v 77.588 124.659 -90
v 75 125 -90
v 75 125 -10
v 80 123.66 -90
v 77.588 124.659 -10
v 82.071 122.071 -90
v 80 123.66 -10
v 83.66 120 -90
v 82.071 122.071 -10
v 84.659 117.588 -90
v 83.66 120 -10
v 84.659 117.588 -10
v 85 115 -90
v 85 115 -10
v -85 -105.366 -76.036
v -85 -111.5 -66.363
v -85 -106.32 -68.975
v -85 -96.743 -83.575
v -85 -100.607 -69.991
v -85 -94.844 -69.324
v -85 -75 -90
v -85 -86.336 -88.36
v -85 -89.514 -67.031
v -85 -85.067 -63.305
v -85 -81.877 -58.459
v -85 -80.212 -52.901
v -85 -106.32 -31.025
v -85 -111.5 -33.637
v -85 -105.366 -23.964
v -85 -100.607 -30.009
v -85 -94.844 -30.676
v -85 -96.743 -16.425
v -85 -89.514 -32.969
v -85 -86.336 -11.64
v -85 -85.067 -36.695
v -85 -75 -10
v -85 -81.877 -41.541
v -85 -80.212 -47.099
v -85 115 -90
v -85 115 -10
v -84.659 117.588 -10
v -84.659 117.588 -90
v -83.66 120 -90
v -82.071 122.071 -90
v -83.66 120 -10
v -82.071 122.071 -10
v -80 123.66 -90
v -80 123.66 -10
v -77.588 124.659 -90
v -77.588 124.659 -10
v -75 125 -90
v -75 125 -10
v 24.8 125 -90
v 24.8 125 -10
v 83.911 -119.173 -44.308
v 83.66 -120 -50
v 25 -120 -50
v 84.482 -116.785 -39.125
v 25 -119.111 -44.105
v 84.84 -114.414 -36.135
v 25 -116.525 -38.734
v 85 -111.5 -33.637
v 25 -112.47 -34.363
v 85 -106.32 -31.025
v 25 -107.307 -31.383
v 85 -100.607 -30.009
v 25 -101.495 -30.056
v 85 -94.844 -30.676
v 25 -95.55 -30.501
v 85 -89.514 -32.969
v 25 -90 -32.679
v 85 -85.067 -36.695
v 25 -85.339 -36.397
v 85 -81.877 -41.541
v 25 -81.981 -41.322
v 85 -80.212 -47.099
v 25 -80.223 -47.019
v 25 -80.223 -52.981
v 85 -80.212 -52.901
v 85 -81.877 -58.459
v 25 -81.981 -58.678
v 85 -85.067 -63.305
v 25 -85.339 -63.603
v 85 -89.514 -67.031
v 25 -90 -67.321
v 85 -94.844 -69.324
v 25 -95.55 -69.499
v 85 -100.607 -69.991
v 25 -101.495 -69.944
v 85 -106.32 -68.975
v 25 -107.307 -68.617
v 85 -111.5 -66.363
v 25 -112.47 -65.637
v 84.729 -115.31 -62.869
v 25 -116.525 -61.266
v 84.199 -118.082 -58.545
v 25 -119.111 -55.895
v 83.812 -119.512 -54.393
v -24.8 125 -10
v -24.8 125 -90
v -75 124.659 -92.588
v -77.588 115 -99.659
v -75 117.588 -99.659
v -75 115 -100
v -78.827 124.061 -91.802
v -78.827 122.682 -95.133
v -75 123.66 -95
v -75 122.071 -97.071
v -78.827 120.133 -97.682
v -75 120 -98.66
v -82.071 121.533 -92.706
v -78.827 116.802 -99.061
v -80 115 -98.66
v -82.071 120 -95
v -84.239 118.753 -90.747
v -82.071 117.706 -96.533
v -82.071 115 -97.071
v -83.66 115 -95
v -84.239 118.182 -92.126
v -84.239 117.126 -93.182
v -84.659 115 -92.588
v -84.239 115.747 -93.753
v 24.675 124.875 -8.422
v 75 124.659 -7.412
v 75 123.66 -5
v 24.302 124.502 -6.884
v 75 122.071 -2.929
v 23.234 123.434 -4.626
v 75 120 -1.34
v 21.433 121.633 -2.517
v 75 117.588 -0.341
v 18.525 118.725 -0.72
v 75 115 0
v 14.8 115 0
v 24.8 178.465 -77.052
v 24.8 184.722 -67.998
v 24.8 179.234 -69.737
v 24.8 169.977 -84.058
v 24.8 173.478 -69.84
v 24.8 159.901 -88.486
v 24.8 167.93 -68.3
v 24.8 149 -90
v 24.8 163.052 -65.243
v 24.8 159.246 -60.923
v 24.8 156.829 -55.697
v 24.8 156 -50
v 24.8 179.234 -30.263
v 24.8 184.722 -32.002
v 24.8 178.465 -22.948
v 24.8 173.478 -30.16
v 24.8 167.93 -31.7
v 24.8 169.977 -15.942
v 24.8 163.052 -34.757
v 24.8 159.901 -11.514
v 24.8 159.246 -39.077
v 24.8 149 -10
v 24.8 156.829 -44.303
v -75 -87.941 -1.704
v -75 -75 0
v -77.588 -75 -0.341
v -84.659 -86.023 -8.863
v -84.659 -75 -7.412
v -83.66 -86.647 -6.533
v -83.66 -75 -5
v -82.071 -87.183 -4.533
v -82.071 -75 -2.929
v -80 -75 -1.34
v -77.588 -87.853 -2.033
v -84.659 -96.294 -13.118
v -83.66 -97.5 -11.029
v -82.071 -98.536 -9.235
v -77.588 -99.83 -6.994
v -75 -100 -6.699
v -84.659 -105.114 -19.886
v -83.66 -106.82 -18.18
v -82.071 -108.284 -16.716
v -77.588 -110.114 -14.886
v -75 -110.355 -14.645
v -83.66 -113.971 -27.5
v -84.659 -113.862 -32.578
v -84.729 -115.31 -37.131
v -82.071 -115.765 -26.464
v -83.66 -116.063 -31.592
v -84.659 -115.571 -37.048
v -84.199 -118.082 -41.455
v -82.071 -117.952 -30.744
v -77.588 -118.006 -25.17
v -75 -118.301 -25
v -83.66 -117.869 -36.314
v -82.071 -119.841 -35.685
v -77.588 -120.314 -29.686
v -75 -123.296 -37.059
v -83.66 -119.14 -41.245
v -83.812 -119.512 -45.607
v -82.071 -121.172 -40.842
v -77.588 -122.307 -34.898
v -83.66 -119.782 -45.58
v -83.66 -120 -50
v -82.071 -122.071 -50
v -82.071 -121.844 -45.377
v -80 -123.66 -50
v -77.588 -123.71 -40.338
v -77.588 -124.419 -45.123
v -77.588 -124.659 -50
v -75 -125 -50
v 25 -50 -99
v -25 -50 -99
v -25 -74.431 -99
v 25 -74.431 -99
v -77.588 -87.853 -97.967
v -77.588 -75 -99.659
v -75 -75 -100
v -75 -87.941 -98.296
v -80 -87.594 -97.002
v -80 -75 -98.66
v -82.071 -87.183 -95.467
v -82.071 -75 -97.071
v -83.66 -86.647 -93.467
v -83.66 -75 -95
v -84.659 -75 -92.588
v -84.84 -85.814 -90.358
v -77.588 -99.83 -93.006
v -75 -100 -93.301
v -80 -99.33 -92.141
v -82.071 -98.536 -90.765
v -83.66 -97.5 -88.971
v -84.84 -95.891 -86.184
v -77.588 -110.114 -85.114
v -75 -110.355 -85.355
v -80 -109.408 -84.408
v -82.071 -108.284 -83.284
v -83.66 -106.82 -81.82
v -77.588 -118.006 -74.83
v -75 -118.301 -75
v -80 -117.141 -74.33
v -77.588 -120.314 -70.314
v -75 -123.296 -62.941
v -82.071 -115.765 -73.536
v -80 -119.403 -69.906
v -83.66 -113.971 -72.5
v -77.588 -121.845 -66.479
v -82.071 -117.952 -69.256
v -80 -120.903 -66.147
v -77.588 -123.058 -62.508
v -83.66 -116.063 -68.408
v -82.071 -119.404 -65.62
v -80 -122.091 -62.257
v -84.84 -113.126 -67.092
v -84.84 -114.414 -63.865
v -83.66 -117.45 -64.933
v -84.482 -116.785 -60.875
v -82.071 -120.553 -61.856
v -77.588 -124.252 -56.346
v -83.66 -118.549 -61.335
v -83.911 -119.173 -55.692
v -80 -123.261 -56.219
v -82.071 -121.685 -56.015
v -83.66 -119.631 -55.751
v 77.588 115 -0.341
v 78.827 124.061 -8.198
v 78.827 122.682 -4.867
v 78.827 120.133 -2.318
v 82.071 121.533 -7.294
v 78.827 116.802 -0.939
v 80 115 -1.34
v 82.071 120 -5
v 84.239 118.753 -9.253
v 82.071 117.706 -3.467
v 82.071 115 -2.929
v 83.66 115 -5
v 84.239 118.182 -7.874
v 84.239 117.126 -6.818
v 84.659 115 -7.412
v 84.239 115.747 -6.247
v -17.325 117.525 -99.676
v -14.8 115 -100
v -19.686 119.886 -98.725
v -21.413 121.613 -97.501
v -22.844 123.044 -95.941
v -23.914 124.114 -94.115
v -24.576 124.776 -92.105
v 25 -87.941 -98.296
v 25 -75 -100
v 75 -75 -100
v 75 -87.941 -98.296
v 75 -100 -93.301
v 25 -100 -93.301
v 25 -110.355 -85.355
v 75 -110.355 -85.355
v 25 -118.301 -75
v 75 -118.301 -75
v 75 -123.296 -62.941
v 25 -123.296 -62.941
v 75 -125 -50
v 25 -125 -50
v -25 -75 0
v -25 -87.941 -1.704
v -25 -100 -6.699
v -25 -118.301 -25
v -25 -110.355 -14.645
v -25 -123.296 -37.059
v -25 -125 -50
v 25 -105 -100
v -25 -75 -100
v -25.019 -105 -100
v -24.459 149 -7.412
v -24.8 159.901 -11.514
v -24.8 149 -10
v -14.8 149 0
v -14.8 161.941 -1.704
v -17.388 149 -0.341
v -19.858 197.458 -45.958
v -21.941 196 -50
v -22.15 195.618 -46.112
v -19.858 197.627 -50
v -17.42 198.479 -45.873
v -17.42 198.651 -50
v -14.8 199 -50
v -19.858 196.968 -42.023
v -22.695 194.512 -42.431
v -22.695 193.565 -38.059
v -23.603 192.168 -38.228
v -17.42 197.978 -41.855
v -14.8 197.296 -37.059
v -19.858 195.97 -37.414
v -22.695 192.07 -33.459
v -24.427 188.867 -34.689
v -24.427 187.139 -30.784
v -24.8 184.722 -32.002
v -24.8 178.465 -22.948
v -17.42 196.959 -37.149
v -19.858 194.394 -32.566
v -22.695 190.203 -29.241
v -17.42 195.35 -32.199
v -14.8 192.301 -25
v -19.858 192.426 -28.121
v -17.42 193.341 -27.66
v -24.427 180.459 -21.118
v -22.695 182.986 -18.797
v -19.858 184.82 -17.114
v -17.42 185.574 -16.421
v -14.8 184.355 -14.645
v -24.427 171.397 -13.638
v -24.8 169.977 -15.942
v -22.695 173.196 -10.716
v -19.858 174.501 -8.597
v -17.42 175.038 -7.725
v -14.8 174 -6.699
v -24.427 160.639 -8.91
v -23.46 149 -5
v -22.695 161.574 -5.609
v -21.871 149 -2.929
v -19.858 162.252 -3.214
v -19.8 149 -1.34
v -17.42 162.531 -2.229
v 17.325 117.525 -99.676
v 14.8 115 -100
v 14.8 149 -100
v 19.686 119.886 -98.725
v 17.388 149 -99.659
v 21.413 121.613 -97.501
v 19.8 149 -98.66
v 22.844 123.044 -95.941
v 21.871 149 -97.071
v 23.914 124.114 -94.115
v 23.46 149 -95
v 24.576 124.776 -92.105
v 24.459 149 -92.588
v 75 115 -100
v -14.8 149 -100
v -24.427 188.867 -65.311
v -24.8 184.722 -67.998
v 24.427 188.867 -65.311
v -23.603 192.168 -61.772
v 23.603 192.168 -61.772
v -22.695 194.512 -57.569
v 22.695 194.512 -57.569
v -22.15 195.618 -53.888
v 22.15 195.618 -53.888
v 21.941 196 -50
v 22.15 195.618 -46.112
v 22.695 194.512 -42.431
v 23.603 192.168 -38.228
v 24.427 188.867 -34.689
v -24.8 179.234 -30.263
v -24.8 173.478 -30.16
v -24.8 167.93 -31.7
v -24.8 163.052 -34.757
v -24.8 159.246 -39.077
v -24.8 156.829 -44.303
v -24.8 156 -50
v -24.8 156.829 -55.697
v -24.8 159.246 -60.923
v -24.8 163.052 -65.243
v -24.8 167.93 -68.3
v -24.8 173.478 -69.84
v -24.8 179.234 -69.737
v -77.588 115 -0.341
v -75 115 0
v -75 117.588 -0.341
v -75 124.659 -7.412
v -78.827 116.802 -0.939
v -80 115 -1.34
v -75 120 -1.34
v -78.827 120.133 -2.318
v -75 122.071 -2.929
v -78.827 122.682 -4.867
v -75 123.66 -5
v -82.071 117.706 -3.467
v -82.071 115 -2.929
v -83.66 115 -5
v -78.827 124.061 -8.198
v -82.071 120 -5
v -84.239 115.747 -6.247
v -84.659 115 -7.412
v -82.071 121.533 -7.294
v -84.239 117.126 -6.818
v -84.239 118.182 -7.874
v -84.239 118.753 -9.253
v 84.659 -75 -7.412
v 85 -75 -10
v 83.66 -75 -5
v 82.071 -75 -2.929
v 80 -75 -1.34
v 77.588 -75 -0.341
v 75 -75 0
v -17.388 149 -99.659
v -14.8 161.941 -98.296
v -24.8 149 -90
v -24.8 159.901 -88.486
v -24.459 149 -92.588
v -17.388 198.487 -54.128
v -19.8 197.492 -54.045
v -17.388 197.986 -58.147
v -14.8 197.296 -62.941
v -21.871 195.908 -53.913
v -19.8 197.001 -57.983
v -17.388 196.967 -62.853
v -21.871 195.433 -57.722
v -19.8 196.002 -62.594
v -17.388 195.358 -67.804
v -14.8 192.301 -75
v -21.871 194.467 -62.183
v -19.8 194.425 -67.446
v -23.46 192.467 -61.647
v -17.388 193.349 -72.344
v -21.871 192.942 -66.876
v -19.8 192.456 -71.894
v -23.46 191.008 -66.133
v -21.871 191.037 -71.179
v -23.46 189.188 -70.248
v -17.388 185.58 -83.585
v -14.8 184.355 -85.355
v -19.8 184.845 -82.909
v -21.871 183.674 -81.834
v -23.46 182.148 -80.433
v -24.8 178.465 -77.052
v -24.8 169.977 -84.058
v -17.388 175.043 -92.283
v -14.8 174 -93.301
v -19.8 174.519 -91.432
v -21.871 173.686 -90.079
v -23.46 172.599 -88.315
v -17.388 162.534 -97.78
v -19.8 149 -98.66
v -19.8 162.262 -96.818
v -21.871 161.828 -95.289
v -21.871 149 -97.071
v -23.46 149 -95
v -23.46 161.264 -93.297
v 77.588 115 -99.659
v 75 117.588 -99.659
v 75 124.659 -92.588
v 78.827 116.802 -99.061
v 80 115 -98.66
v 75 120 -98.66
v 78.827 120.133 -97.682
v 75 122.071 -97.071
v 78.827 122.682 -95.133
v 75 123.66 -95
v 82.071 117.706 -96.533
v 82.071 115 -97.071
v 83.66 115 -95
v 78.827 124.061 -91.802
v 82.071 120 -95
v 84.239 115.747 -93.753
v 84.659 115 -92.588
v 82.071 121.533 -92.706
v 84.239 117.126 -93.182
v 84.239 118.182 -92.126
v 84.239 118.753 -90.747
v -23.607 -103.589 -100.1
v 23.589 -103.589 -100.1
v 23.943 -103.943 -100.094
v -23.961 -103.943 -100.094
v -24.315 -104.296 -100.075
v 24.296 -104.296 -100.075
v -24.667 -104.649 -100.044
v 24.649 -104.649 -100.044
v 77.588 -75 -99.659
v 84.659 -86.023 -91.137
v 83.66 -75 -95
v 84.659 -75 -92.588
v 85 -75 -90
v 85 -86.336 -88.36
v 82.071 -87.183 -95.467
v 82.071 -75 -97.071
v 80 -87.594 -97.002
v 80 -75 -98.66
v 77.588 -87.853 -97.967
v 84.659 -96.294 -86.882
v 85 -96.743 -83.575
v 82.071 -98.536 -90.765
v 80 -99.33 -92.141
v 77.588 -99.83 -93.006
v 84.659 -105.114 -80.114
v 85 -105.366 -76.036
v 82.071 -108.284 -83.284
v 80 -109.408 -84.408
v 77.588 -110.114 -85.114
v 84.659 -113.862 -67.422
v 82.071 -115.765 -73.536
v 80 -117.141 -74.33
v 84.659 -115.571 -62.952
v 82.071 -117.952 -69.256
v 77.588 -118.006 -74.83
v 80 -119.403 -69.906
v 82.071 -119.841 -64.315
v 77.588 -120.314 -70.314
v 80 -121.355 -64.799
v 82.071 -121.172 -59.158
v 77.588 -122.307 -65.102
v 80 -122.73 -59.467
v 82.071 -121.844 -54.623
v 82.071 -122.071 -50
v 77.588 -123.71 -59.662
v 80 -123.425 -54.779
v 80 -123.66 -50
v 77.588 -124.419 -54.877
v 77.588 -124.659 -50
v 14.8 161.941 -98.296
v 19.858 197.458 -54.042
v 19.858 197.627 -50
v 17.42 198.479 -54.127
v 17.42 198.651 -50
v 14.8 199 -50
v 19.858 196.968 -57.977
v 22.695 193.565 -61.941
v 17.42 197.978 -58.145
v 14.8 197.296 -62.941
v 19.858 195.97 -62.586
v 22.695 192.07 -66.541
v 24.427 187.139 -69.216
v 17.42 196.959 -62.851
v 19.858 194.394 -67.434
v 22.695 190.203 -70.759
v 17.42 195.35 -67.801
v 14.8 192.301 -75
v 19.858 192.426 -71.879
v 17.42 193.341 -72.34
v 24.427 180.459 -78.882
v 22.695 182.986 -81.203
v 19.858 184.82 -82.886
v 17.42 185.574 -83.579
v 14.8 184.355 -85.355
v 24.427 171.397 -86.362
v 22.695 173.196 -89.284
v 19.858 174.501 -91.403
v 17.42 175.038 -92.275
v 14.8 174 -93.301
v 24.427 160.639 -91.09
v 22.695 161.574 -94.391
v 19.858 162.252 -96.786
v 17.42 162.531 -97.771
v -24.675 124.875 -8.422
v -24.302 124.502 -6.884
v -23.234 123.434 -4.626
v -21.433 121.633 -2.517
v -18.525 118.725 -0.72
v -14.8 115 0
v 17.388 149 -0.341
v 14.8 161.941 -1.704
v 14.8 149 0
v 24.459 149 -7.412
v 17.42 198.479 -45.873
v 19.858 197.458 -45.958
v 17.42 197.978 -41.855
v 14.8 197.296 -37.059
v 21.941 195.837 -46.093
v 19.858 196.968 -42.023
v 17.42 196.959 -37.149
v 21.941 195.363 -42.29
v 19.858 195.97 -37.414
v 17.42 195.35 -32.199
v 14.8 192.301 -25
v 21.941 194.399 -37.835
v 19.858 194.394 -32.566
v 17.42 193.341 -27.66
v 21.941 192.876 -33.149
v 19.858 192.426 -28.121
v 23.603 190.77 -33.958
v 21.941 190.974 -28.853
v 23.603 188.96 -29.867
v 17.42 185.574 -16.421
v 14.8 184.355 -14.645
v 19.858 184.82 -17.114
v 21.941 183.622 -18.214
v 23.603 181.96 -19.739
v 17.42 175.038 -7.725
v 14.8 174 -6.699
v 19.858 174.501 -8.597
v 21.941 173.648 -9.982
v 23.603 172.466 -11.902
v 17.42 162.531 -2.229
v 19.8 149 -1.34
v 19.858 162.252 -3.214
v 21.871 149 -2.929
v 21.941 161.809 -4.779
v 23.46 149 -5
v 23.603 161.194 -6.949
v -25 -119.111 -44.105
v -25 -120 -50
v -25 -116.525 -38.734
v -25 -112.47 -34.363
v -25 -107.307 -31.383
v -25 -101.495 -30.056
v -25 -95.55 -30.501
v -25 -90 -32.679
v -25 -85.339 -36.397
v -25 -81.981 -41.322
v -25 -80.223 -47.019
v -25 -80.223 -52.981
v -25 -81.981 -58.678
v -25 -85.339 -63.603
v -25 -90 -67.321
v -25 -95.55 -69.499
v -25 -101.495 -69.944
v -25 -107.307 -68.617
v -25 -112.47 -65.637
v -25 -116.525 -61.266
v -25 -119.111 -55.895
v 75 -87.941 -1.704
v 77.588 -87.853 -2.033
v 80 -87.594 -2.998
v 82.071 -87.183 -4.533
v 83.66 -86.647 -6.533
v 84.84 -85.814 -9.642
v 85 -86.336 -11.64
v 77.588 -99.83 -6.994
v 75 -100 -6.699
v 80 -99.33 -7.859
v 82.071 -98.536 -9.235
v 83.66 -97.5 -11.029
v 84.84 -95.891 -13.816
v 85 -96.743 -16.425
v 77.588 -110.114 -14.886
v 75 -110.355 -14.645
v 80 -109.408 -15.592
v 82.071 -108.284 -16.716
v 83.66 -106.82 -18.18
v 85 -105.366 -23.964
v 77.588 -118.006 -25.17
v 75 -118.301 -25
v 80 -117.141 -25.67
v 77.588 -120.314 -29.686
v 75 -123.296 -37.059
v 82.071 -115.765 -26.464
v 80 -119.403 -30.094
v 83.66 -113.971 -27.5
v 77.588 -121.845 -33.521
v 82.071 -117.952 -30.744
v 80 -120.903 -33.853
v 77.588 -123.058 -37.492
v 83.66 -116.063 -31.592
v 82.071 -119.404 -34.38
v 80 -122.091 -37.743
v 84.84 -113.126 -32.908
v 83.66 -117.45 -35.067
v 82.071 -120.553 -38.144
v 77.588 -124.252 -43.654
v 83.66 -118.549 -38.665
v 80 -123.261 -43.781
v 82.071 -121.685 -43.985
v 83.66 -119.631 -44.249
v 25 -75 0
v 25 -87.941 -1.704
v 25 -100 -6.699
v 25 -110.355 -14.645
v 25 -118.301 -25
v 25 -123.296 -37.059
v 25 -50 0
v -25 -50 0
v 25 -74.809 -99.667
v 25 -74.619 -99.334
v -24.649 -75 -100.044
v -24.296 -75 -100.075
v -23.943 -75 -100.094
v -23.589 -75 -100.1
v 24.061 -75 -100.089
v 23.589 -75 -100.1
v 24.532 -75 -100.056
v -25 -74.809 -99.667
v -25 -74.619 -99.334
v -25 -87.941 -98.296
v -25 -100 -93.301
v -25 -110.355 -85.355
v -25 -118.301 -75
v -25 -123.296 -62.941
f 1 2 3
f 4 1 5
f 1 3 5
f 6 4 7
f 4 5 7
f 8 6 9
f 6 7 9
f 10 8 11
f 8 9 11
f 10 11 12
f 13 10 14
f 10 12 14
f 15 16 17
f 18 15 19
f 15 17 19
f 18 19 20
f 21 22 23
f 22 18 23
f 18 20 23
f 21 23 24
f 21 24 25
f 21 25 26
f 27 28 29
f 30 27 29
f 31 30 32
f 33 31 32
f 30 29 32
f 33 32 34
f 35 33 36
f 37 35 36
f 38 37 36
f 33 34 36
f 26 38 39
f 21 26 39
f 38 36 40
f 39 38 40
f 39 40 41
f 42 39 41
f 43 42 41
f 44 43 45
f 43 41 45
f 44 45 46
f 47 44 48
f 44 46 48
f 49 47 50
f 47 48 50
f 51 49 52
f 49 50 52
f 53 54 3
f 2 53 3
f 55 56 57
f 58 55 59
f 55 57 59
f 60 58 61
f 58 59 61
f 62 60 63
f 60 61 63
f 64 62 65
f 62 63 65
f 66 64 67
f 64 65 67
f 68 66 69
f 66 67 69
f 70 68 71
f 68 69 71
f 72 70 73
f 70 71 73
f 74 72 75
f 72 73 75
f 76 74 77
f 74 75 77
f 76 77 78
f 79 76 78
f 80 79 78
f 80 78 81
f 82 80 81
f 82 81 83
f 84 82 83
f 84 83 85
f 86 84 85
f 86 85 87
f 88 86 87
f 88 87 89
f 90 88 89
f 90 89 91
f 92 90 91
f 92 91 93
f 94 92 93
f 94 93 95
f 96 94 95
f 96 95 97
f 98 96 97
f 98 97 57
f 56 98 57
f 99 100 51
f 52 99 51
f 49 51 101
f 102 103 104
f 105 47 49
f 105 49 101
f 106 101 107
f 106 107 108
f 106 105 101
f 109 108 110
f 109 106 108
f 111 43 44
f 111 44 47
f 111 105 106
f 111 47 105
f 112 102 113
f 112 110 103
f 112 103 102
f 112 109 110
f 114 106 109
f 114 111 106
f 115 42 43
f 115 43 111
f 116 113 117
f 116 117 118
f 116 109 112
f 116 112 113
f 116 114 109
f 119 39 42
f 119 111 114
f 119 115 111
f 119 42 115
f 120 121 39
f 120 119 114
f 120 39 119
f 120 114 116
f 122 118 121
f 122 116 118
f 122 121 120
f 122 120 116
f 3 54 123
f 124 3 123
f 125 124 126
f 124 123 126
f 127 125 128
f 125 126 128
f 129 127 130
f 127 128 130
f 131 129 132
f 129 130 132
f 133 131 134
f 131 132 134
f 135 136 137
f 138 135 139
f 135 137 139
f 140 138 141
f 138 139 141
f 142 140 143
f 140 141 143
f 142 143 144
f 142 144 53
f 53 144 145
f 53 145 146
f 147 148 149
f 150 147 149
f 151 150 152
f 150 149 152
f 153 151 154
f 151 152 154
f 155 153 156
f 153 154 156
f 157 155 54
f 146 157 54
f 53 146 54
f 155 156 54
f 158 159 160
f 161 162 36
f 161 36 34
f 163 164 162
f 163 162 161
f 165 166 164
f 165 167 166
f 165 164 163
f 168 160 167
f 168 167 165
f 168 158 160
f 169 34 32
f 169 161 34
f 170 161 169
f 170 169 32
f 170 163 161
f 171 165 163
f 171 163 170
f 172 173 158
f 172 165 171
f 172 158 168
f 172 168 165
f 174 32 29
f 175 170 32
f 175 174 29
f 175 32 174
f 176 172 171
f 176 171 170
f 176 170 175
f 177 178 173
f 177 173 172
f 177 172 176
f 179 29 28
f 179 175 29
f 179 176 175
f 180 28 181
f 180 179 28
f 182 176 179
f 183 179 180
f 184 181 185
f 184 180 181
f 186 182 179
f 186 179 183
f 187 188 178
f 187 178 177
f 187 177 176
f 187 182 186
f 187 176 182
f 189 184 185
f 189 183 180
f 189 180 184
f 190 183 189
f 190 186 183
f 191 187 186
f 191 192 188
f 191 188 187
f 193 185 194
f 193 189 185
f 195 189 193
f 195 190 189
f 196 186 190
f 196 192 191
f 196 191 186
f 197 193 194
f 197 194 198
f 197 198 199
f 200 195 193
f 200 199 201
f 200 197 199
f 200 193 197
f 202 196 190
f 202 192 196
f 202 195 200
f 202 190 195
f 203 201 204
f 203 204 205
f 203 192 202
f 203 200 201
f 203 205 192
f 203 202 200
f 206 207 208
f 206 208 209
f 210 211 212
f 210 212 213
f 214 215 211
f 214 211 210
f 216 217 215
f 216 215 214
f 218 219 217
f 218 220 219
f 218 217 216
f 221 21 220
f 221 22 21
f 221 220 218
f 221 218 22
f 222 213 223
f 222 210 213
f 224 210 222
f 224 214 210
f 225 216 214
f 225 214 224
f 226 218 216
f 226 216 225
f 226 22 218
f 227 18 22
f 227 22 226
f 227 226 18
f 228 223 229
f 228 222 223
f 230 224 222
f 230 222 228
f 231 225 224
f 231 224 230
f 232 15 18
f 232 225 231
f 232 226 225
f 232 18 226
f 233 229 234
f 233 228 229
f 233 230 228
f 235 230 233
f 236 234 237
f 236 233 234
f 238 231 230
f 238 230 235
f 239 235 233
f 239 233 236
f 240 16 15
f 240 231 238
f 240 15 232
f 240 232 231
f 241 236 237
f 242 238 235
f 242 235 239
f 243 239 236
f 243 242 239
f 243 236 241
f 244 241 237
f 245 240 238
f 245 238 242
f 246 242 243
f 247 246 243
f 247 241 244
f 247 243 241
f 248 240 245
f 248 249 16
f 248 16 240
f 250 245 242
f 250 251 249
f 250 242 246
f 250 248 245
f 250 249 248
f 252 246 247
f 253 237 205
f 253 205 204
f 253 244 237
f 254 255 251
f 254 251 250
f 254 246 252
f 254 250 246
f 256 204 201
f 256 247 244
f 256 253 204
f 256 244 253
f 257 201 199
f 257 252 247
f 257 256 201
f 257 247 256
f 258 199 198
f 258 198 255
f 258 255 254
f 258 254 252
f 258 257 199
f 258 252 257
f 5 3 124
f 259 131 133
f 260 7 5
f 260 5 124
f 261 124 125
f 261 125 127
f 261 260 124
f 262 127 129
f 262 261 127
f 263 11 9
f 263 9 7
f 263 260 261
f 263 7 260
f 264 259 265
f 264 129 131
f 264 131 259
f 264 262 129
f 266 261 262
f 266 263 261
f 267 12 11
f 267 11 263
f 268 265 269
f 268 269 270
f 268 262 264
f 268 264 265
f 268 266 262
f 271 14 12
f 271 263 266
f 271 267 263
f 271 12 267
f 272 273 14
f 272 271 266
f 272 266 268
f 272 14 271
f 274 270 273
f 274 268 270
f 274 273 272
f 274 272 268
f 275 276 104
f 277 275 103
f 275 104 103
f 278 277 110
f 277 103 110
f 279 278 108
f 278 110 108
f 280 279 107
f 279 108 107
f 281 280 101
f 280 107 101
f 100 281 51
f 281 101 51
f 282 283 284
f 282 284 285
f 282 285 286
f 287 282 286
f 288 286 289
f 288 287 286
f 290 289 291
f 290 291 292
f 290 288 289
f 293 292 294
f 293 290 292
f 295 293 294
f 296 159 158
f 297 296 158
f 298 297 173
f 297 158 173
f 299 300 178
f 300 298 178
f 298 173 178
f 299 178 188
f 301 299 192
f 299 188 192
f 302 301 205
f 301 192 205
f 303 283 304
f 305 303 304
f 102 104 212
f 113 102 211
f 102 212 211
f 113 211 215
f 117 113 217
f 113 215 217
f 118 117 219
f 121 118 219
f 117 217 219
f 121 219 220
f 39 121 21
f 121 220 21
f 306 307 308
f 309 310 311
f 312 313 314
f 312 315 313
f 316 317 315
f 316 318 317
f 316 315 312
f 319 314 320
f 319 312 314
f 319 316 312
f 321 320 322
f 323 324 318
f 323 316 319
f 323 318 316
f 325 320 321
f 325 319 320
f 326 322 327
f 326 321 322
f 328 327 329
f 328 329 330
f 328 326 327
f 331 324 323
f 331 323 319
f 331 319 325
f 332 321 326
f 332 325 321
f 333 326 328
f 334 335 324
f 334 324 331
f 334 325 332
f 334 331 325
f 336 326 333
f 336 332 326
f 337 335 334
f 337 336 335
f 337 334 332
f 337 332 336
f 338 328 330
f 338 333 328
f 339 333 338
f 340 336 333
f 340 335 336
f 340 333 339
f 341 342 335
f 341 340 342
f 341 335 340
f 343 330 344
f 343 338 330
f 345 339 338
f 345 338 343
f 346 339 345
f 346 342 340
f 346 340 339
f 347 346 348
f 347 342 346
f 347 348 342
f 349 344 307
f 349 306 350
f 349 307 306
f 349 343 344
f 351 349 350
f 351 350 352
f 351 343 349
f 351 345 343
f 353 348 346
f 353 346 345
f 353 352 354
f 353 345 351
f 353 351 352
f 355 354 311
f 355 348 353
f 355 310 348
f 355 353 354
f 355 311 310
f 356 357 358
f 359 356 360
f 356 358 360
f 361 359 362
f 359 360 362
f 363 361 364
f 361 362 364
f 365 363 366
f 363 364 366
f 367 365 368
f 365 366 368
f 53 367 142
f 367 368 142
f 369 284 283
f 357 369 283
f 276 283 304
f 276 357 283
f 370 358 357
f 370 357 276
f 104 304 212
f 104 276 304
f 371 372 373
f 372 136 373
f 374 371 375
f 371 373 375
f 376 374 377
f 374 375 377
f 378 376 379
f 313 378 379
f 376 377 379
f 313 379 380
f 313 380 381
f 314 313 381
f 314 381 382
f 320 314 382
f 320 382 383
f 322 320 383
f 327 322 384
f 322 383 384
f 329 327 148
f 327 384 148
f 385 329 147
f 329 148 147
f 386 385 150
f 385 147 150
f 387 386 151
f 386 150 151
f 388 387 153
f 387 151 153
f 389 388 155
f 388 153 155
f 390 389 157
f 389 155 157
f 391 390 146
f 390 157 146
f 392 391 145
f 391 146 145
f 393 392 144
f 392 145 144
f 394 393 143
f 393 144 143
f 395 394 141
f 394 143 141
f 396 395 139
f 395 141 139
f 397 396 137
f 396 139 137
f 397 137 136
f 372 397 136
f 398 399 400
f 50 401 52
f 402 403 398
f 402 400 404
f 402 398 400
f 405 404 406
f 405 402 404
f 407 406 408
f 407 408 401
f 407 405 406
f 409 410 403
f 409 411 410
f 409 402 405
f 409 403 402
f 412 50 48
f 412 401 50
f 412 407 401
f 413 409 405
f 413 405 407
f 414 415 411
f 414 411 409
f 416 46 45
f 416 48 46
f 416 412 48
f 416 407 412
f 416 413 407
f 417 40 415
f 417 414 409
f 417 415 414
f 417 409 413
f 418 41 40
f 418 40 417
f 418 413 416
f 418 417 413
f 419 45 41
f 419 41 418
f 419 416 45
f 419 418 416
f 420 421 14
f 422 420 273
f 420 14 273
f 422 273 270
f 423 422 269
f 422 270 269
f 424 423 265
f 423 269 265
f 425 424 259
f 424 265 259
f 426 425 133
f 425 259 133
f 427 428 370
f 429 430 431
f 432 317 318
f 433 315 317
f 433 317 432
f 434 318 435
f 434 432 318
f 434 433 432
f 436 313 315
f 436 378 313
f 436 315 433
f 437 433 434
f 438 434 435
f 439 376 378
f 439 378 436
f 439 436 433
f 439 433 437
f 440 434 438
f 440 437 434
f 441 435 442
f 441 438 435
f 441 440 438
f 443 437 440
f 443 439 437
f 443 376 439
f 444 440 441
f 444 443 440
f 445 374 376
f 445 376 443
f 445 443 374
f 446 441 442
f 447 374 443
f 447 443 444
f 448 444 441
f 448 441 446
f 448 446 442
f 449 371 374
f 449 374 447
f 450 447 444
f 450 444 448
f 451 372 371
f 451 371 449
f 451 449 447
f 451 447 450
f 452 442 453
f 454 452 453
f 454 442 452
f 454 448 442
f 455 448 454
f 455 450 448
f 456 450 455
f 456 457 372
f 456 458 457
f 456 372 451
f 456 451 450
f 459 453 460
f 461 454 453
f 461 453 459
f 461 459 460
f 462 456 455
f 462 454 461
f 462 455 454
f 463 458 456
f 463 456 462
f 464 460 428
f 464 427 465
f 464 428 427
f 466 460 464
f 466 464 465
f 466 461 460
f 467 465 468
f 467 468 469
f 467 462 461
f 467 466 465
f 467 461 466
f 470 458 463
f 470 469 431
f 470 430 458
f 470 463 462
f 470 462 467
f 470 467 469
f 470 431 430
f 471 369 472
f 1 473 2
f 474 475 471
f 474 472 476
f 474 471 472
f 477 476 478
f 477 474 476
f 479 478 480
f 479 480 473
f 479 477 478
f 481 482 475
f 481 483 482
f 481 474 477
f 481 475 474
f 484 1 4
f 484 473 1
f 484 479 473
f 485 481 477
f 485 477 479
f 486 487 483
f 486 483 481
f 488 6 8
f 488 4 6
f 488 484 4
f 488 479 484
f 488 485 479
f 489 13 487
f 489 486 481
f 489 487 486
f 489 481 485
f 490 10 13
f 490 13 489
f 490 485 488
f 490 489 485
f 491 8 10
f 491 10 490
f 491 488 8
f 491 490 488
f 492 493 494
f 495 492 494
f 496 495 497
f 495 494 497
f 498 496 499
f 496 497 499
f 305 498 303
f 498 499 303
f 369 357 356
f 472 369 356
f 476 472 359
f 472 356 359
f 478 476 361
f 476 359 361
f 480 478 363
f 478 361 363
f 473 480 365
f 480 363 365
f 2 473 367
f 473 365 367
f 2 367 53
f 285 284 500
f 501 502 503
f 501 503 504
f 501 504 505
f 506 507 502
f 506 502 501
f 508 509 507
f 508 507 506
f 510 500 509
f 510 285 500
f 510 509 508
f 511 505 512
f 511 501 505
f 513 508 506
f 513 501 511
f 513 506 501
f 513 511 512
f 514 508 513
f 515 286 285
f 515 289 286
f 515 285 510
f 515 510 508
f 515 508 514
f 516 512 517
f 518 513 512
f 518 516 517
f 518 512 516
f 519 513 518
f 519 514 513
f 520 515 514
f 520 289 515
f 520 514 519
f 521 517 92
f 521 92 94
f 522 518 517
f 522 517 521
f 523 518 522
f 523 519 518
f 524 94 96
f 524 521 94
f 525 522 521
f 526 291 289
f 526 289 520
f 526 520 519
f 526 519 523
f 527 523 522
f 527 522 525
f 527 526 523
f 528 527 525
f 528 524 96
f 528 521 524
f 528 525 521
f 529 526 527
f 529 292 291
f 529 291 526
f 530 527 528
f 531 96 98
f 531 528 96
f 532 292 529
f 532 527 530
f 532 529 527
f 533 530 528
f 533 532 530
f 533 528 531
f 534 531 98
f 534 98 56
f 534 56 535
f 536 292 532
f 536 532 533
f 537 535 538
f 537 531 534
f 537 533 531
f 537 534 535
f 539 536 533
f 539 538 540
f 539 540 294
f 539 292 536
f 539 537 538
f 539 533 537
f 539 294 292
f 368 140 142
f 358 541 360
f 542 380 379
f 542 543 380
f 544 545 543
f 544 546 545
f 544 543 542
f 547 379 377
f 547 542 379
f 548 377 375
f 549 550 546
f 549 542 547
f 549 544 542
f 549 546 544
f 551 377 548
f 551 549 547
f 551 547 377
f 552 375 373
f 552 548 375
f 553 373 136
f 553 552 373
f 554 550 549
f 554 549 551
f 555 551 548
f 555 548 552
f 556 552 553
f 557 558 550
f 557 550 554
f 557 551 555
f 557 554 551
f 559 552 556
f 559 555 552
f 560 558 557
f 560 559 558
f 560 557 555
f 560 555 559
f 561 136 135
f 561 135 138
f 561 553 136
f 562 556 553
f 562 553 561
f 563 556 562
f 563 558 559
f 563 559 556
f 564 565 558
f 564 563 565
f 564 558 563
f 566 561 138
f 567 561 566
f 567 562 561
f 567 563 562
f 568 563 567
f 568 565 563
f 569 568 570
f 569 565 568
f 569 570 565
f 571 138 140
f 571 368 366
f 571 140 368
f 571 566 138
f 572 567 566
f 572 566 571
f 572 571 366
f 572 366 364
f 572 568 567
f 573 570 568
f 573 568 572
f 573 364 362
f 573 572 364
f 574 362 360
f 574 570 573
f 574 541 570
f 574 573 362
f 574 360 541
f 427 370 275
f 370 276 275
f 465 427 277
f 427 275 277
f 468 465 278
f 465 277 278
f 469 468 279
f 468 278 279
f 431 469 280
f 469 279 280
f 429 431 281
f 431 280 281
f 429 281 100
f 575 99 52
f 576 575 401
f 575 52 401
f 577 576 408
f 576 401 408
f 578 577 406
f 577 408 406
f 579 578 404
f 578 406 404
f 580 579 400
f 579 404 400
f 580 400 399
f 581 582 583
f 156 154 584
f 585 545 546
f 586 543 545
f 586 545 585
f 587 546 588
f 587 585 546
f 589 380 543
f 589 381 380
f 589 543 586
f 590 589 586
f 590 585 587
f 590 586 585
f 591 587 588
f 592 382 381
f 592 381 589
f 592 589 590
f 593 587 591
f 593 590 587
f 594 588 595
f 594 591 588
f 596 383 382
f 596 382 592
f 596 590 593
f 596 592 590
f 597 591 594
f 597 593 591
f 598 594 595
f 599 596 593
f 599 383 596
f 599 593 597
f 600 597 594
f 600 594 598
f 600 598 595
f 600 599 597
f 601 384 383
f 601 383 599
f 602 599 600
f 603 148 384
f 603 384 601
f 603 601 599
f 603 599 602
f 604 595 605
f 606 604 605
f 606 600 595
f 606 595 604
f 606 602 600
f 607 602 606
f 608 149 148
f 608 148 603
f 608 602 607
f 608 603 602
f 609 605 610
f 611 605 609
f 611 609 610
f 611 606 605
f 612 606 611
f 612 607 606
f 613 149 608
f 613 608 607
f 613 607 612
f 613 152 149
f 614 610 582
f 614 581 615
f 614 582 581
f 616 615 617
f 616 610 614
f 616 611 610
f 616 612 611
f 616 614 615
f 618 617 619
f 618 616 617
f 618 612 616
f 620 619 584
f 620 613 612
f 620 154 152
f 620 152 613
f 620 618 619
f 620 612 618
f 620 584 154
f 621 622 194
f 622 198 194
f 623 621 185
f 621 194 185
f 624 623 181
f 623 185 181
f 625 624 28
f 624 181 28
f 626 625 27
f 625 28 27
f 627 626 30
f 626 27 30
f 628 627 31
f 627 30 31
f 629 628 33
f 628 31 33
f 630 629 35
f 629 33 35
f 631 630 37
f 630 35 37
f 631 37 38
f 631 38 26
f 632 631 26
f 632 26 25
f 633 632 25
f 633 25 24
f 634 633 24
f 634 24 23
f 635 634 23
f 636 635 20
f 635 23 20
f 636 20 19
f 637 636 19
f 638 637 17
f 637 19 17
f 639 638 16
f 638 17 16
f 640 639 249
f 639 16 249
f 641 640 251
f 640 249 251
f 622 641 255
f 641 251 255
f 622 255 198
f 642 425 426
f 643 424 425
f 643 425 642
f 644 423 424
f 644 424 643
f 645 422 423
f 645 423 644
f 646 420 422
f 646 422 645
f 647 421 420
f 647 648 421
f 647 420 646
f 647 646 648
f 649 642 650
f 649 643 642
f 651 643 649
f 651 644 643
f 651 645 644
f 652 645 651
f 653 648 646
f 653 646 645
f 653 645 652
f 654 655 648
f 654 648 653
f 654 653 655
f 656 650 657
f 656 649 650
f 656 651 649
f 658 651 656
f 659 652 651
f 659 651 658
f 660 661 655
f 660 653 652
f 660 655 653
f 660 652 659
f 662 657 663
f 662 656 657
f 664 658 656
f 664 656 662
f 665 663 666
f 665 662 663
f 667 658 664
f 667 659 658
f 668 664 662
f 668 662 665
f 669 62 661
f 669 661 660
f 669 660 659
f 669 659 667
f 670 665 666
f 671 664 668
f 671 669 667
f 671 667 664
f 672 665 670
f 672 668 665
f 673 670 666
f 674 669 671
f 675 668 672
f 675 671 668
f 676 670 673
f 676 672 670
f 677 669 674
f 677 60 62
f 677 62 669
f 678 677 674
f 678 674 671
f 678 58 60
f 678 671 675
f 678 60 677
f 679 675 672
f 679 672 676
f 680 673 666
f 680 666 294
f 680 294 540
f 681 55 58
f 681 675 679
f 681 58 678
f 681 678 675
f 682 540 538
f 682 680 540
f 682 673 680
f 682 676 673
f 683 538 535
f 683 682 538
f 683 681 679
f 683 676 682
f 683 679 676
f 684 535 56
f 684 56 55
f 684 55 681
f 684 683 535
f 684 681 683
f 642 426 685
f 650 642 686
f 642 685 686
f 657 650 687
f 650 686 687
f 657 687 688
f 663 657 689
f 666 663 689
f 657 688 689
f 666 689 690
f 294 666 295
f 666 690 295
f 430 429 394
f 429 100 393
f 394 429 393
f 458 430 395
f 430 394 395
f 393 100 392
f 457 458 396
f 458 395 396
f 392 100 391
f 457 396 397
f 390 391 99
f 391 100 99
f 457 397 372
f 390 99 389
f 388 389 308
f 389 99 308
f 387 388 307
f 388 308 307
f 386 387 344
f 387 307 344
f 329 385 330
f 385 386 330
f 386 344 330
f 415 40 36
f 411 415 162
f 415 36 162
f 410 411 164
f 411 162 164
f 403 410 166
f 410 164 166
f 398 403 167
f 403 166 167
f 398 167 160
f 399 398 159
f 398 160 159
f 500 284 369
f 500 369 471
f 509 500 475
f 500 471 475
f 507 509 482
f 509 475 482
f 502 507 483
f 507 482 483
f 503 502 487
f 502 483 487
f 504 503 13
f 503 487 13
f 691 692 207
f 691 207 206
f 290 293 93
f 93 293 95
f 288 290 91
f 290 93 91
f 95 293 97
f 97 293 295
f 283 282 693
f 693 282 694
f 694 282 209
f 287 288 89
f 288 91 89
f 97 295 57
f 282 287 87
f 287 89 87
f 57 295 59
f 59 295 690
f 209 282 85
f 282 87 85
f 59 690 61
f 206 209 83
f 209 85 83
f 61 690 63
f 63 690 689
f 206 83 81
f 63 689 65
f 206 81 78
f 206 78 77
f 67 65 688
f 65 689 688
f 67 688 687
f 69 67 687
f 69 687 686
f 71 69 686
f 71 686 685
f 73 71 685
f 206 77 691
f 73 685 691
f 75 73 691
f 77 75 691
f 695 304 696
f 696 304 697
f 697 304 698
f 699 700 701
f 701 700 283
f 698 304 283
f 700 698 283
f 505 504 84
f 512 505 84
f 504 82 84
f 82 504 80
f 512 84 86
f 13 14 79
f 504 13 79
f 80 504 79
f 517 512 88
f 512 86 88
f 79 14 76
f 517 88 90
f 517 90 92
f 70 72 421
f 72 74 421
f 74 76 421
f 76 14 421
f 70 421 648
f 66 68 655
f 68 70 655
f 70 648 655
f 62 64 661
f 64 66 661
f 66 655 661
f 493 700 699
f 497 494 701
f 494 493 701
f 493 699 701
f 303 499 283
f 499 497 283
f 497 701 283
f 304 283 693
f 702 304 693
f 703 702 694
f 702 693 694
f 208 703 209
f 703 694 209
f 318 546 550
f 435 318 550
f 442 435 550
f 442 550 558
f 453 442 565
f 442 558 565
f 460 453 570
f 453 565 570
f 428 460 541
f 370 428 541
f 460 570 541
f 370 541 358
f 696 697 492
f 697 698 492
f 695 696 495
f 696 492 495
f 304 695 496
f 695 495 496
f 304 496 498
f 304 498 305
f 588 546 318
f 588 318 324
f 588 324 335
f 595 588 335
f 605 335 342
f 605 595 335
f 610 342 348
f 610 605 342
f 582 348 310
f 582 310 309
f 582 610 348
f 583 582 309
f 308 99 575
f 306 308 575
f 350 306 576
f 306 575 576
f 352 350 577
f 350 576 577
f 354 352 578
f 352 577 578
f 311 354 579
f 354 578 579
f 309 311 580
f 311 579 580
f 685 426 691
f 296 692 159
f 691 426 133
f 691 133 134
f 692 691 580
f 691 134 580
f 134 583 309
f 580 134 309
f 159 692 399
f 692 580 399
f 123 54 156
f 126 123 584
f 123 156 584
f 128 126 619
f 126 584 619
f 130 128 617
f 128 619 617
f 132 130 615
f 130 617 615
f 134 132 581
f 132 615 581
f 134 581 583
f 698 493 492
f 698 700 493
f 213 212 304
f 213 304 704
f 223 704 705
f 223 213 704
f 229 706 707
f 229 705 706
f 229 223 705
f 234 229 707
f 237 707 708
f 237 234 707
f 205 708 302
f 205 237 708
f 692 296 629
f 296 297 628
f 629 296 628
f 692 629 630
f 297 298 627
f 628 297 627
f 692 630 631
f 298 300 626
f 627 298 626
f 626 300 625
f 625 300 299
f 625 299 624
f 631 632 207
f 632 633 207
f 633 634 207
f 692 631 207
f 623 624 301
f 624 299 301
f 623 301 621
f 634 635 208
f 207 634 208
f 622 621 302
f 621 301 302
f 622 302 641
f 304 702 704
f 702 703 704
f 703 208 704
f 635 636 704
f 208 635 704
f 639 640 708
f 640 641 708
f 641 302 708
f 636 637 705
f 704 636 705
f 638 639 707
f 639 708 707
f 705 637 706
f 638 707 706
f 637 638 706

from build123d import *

# Parameters (mm, degrees)
BOSS_EXTRUDE1_DEPTH    = 100
SKETCH2_W              = 50
SKETCH2_H              = 50
CUT_EXTRUDE1_DEPTH     = 239.382046304
FILLET1_R              = 50
CUT_EXTRUDE2_DEPTH     = 25
SKETCH7_R              = 20
CUT_EXTRUDE3_DEPTH     = 281.180299093
FILLET2_R              = 50
CUT_EXTRUDE6_START     = -125
CUT_EXTRUDE6_OUTLINE_W = 50
CUT_EXTRUDE6_OUTLINE_H = 6.698729811
CUT_EXTRUDE6_DEPTH     = 50
CUT_EXTRUDE7_DEPTH     = 25
FILLET3_R              = 10
SKETCH11_W             = 50
SKETCH11_H             = 25
CUT_EXTRUDE8_DEPTH     = 99
BOSS_EXTRUDE7_DEPTH    = 0.1
FILLET4_R              = 10
FILLET5_R              = 10
SKETCH14_R             = 20
CUT_EXTRUDE9_DEPTH     = 249.348646185


with BuildPart() as part:
    # Sketch1 → Boss-Extrude1 (new body)
    with BuildSketch(Plane.XY):
        Polygon((-24.8, 125), (-24.8, 199), (24.8, 199), (24.8, 125), (85, 125), (85, -125), (-85, -125), (-85, 125), align=None)
    extrude(amount=-BOSS_EXTRUDE1_DEPTH)

    # Sketch2 → Cut-Extrude1 (cut, through all)
    with BuildSketch(Plane.XY):
        with Locations((0, -125)):
            Rectangle(SKETCH2_W, SKETCH2_H)
    extrude(amount=-CUT_EXTRUDE1_DEPTH, mode=Mode.SUBTRACT)

    # Fillet1
    fillet1_edges = [part.edges().sort_by_distance(p)[0] for p in [
        (0, 199, -100),
        (0, 199, 0),
    ]]
    fillet(fillet1_edges, radius=FILLET1_R - 0.0001)  # a hair under: the kernel refuses the full size

    # Sketch6 → Cut-Extrude2 (cut, symmetric)
    with BuildSketch(Plane(origin=(0, 0, 0), x_dir=(0, 0, -1), z_dir=(1, 0, 0))):
        with BuildLine():
            Line((100, -100), (0, -100))
            ThreePointArc((0, -100), (50, -50), (100, -100))
        make_face()
    extrude(amount=CUT_EXTRUDE2_DEPTH, both=True, mode=Mode.SUBTRACT)

    # Sketch7 → Cut-Extrude3 (cut, through all)
    with BuildSketch(Plane.ZY.offset(85)):
        with Locations(Location((-50, -100, 0), (0, 0, 270))):
            Circle(SKETCH7_R)
    extrude(amount=-CUT_EXTRUDE3_DEPTH, mode=Mode.SUBTRACT)

    # Fillet2
    fillet2_edges = [part.edges().sort_by_distance(p)[0] for p in [
        (-55, -125, -100),
        (-55, -125, 0),
    ]]
    fillet(fillet2_edges, radius=FILLET2_R - 0.0001)  # a hair under: the kernel refuses the full size

    # Cut-Extrude6: read off the stored shape, not the designer's step
    # Cut-Extrude6 outline → Cut-Extrude6 (cut)
    with BuildSketch(Plane(origin=(0, 0, 0), x_dir=(1, 0, 0), z_dir=(0, 1, 0)).offset(CUT_EXTRUDE6_START)):
        with Locations((0, 96.650635095)):
            Rectangle(CUT_EXTRUDE6_OUTLINE_W, CUT_EXTRUDE6_OUTLINE_H)
        with Locations((0, 3.349364906)):
            Rectangle(CUT_EXTRUDE6_OUTLINE_W, CUT_EXTRUDE6_OUTLINE_H)
    extrude(amount=CUT_EXTRUDE6_DEPTH, mode=Mode.SUBTRACT)

    # Sketch10 → Cut-Extrude7 (cut, symmetric)
    with BuildSketch(Plane(origin=(0, 0, 0), x_dir=(0, 0, -1), z_dir=(1, 0, 0))):
        with BuildLine():
            Line((0, -75), (100, -75))
            ThreePointArc((100, -75), (50, -61.611517322), (0, -75))
        make_face()
    extrude(amount=CUT_EXTRUDE7_DEPTH, both=True, mode=Mode.SUBTRACT)

    # Fillet3
    # the kernel refuses this fillet: 10 mm, written as the material it takes off along each edge
    with BuildSketch(Plane(origin=(24.8, 149.0001, -100), x_dir=(0, 0, 1), z_dir=(0, -1, 0)), Plane(origin=(-24.8, 125, 0), x_dir=(1, 0, 0), z_dir=(0, 1, 0)), Plane(origin=(-24.8, 125, -100), x_dir=(0, 0, 1), z_dir=(0, 1, 0)), Plane(origin=(24.8, 149.0001, 0), x_dir=(-1, 0, 0), z_dir=(0, -1, 0))) as fillet3_piece_1:
        with BuildLine():
            CenterArc((FILLET3_R, FILLET3_R), FILLET3_R, 180, 90)
            Line((0, FILLET3_R), (0, 0))
            Line((0, 0), (FILLET3_R, 0))
        make_face()
    extrude(amount=24.0001, mode=Mode.SUBTRACT)
    with BuildSketch(Plane(origin=(24.8, 125, 0), x_dir=(0, -1, 0), z_dir=(1, 0, 0)), Plane(origin=(-110, 125, -100), x_dir=(0, 0, 1), z_dir=(1, 0, 0)), Plane(origin=(24.8, 125, -100), x_dir=(0, 0, 1), z_dir=(1, 0, 0)), Plane(origin=(-110, 125, 0), x_dir=(0, -1, 0), z_dir=(1, 0, 0))) as fillet3_piece_2:
        with BuildLine():
            CenterArc((FILLET3_R, FILLET3_R), FILLET3_R, 180, 90)
            Line((0, FILLET3_R), (0, 0))
            Line((0, 0), (FILLET3_R, 0))
        make_face()
    extrude(amount=85.2, mode=Mode.SUBTRACT)
    with BuildSketch(Plane(origin=(-85, -75.0001, -100), x_dir=(0, 0, 1), z_dir=(0, 1, 0)), Plane(origin=(85, 150, 0), x_dir=(-1, 0, 0), z_dir=(0, -1, 0)), Plane(origin=(85, 150, -100), x_dir=(0, 0, 1), z_dir=(0, -1, 0)), Plane(origin=(-85, -75.0001, 0), x_dir=(1, 0, 0), z_dir=(0, 1, 0))) as fillet3_piece_3:
        with BuildLine():
            CenterArc((FILLET3_R, FILLET3_R), FILLET3_R, 180, 90)
            Line((0, FILLET3_R), (0, 0))
            Line((0, 0), (FILLET3_R, 0))
        make_face()
    extrude(amount=225.0001, mode=Mode.SUBTRACT)
    with BuildSketch(Plane(origin=(-24.8, 149.0001, -49.9999), x_dir=(0, 1, 0), z_dir=(0, 0, -1))) as fillet3_piece_4:
        with BuildLine():
            CenterArc((49.9999 - FILLET3_R, FILLET3_R), FILLET3_R, 270, 90)
            Line((49.9999 - FILLET3_R, 0), (49.9999, 0))
            Line((49.9999, 0), (49.9999, FILLET3_R))
        make_face()
    revolve(axis=Axis((-24.8, 149.0001, -49.9999), (1, 0, 0)), revolution_arc=90, mode=Mode.SUBTRACT)
    with BuildSketch(Plane(origin=(-24.8, 149.0001, -50.0001), x_dir=(0, 1, 0), z_dir=(0, 0, 1))) as fillet3_piece_5:
        with BuildLine():
            CenterArc((49.9999 - FILLET3_R, -FILLET3_R), FILLET3_R, 0, 90)
            Line((49.9999, -FILLET3_R), (49.9999, 0))
            Line((49.9999, 0), (49.9999 - FILLET3_R, 0))
        make_face()
    revolve(axis=Axis((-24.8, 149.0001, -50.0001), (-1, 0, 0)), revolution_arc=90, mode=Mode.SUBTRACT)
    with BuildSketch(Plane(origin=(24.8, 149.0001, -49.9999), x_dir=(0, 1, 0), z_dir=(0, 0, -1))) as fillet3_piece_6:
        with BuildLine():
            CenterArc((49.9999 - FILLET3_R, -FILLET3_R), FILLET3_R, 0, 90)
            Line((49.9999, -FILLET3_R), (49.9999, 0))
            Line((49.9999, 0), (49.9999 - FILLET3_R, 0))
        make_face()
    revolve(axis=Axis((24.8, 149.0001, -49.9999), (1, 0, 0)), revolution_arc=90, mode=Mode.SUBTRACT)
    with BuildSketch(Plane(origin=(24.8, 149.0001, -50.0001), x_dir=(0, 1, 0), z_dir=(0, 0, 1))) as fillet3_piece_7:
        with BuildLine():
            CenterArc((49.9999 - FILLET3_R, FILLET3_R), FILLET3_R, 270, 90)
            Line((49.9999, FILLET3_R), (49.9999, 0))
            Line((49.9999, 0), (49.9999 - FILLET3_R, 0))
        make_face()
    revolve(axis=Axis((24.8, 149.0001, -50.0001), (-1, 0, 0)), revolution_arc=90, mode=Mode.SUBTRACT)
    with BuildSketch(Plane(origin=(85, -75.0001, -49.9999), x_dir=(0, 0, 1), z_dir=(0, 1, 0))) as fillet3_piece_8:
        with BuildLine():
            CenterArc((49.9999 - FILLET3_R, -FILLET3_R), FILLET3_R, 360, 90)
            Line((49.9999, -FILLET3_R), (49.9999, 0))
            Line((49.9999, 0), (49.9999 - FILLET3_R, 0))
        make_face()
    revolve(axis=Axis((85, -75.0001, -49.9999), (1, 0, 0)), revolution_arc=90, mode=Mode.SUBTRACT)
    with BuildSketch(Plane(origin=(85, -75.0001, -50.0001), x_dir=(0, 0, -1), z_dir=(0, 1, 0))) as fillet3_piece_9:
        with BuildLine():
            CenterArc((49.9999 - FILLET3_R, FILLET3_R), FILLET3_R, 270, 90)
            Line((49.9999, FILLET3_R), (49.9999, 0))
            Line((49.9999, 0), (49.9999 - FILLET3_R, 0))
        make_face()
    revolve(axis=Axis((85, -75.0001, -50.0001), (-1, 0, 0)), revolution_arc=90, mode=Mode.SUBTRACT)
    with BuildSketch(Plane(origin=(-85, -75.0001, -49.9999), x_dir=(0, 0, 1), z_dir=(0, 1, 0))) as fillet3_piece_10:
        with BuildLine():
            CenterArc((49.9999 - FILLET3_R, FILLET3_R), FILLET3_R, 270, 90)
            Line((49.9999, FILLET3_R), (49.9999, 0))
            Line((49.9999, 0), (49.9999 - FILLET3_R, 0))
        make_face()
    revolve(axis=Axis((-85, -75.0001, -49.9999), (1, 0, 0)), revolution_arc=90, mode=Mode.SUBTRACT)
    with BuildSketch(Plane(origin=(-85, -75.0001, -50.0001), x_dir=(0, 0, -1), z_dir=(0, 1, 0))) as fillet3_piece_11:
        with BuildLine():
            CenterArc((49.9999 - FILLET3_R, -FILLET3_R), FILLET3_R, 0, 90)
            Line((49.9999, -FILLET3_R), (49.9999, 0))
            Line((49.9999, 0), (49.9999 - FILLET3_R, 0))
        make_face()
    revolve(axis=Axis((-85, -75.0001, -50.0001), (-1, 0, 0)), revolution_arc=90, mode=Mode.SUBTRACT)
    with BuildSketch(Plane(origin=(-85, -125, -49.9999), x_dir=(0, 1, 0), z_dir=(0, 0, -1)), Plane(origin=(24.8, 199, -49.9999), x_dir=(0, -1, 0), z_dir=(0, 0, -1))) as fillet3_piece_12:
        with BuildLine():
            CenterArc((FILLET3_R, FILLET3_R), FILLET3_R, 180, 90)
            Line((0, FILLET3_R), (0, 0))
            Line((0, 0), (FILLET3_R, 0))
        make_face()
    extrude(amount=0.0002, mode=Mode.SUBTRACT)
    with BuildSketch(Plane(origin=(85, -125, -49.9999), x_dir=(0, 1, 0), z_dir=(0, 0, -1)), Plane(origin=(-24.8, 199, -49.9999), x_dir=(0, -1, 0), z_dir=(0, 0, -1))) as fillet3_piece_13:
        with BuildLine():
            CenterArc((FILLET3_R, -FILLET3_R), FILLET3_R, 90, 90)
            Line((0, -FILLET3_R), (0, 0))
            Line((0, 0), (FILLET3_R, 0))
        make_face()
    extrude(amount=0.0002, mode=Mode.SUBTRACT)
    with BuildSketch(Plane(origin=(-0.2, 125, -100), x_dir=(0, 0, 1), z_dir=(1, 0, 0))) as fillet3_piece_14a_section:
        with BuildLine():
            CenterArc((FILLET3_R, FILLET3_R), FILLET3_R, 180, 90)
            Line((0, FILLET3_R), (0, 0))
            Line((0, 0), (FILLET3_R, 0))
        make_face()
    fillet3_piece_14a = extrude(amount=110.2, mode=Mode.PRIVATE)
    fillet3_piece_14a = split(fillet3_piece_14a, bisect_by=Plane(origin=(24.8, 125, -100), z_dir=(-1, 0, 0)), keep=Keep.TOP, mode=Mode.PRIVATE)
    with BuildSketch(Plane(origin=(24.8, 149.0001, -100), x_dir=(0, 0, 1), z_dir=(0, -1, 0))) as fillet3_piece_14b_section:
        with BuildLine():
            CenterArc((FILLET3_R, FILLET3_R), FILLET3_R, 180, 90)
            Line((0, FILLET3_R), (0, 0))
            Line((0, 0), (FILLET3_R, 0))
        make_face()
    fillet3_piece_14b = extrude(amount=49.0001, mode=Mode.PRIVATE)
    fillet3_piece_14b = split(fillet3_piece_14b, bisect_by=Plane(origin=(24.8, 125, -100), z_dir=(0, -1, 0)), keep=Keep.TOP, mode=Mode.PRIVATE)
    fillet3_piece_14 = fillet3_piece_14a & fillet3_piece_14b
    add(fillet3_piece_14, mode=Mode.SUBTRACT)
    with BuildSketch(Plane(origin=(-0.2, 125, 0), x_dir=(0, -1, 0), z_dir=(1, 0, 0))) as fillet3_piece_15a_section:
        with BuildLine():
            CenterArc((FILLET3_R, FILLET3_R), FILLET3_R, 180, 90)
            Line((0, FILLET3_R), (0, 0))
            Line((0, 0), (FILLET3_R, 0))
        make_face()
    fillet3_piece_15a = extrude(amount=110.2, mode=Mode.PRIVATE)
    fillet3_piece_15a = split(fillet3_piece_15a, bisect_by=Plane(origin=(24.8, 125, 0), z_dir=(-1, 0, 0)), keep=Keep.TOP, mode=Mode.PRIVATE)
    with BuildSketch(Plane(origin=(24.8, 149.0001, 0), x_dir=(-1, 0, 0), z_dir=(0, -1, 0))) as fillet3_piece_15b_section:
        with BuildLine():
            CenterArc((FILLET3_R, FILLET3_R), FILLET3_R, 180, 90)
            Line((0, FILLET3_R), (0, 0))
            Line((0, 0), (FILLET3_R, 0))
        make_face()
    fillet3_piece_15b = extrude(amount=49.0001, mode=Mode.PRIVATE)
    fillet3_piece_15b = split(fillet3_piece_15b, bisect_by=Plane(origin=(24.8, 125, 0), z_dir=(0, -1, 0)), keep=Keep.TOP, mode=Mode.PRIVATE)
    fillet3_piece_15 = fillet3_piece_15a & fillet3_piece_15b
    add(fillet3_piece_15, mode=Mode.SUBTRACT)
    with BuildSketch(Plane(origin=(-24.8, 100, -100), x_dir=(0, 0, 1), z_dir=(0, 1, 0))) as fillet3_piece_16a_section:
        with BuildLine():
            CenterArc((FILLET3_R, FILLET3_R), FILLET3_R, 180, 90)
            Line((0, FILLET3_R), (0, 0))
            Line((0, 0), (FILLET3_R, 0))
        make_face()
    fillet3_piece_16a = extrude(amount=49.0001, mode=Mode.PRIVATE)
    fillet3_piece_16a = split(fillet3_piece_16a, bisect_by=Plane(origin=(-24.8, 125, -100), z_dir=(0, -1, 0)), keep=Keep.TOP, mode=Mode.PRIVATE)
    with BuildSketch(Plane(origin=(-110, 125, -100), x_dir=(0, 0, 1), z_dir=(1, 0, 0))) as fillet3_piece_16b_section:
        with BuildLine():
            CenterArc((FILLET3_R, FILLET3_R), FILLET3_R, 180, 90)
            Line((0, FILLET3_R), (0, 0))
            Line((0, 0), (FILLET3_R, 0))
        make_face()
    fillet3_piece_16b = extrude(amount=110.2, mode=Mode.PRIVATE)
    fillet3_piece_16b = split(fillet3_piece_16b, bisect_by=Plane(origin=(-24.8, 125, -100), z_dir=(1, 0, 0)), keep=Keep.TOP, mode=Mode.PRIVATE)
    fillet3_piece_16 = fillet3_piece_16a & fillet3_piece_16b
    add(fillet3_piece_16, mode=Mode.SUBTRACT)
    with BuildSketch(Plane(origin=(-24.8, 100, 0), x_dir=(1, 0, 0), z_dir=(0, 1, 0))) as fillet3_piece_17a_section:
        with BuildLine():
            CenterArc((FILLET3_R, FILLET3_R), FILLET3_R, 180, 90)
            Line((0, FILLET3_R), (0, 0))
            Line((0, 0), (FILLET3_R, 0))
        make_face()
    fillet3_piece_17a = extrude(amount=49.0001, mode=Mode.PRIVATE)
    fillet3_piece_17a = split(fillet3_piece_17a, bisect_by=Plane(origin=(-24.8, 125, 0), z_dir=(0, -1, 0)), keep=Keep.TOP, mode=Mode.PRIVATE)
    with BuildSketch(Plane(origin=(-110, 125, 0), x_dir=(0, -1, 0), z_dir=(1, 0, 0))) as fillet3_piece_17b_section:
        with BuildLine():
            CenterArc((FILLET3_R, FILLET3_R), FILLET3_R, 180, 90)
            Line((0, FILLET3_R), (0, 0))
            Line((0, 0), (FILLET3_R, 0))
        make_face()
    fillet3_piece_17b = extrude(amount=110.2, mode=Mode.PRIVATE)
    fillet3_piece_17b = split(fillet3_piece_17b, bisect_by=Plane(origin=(-24.8, 125, 0), z_dir=(1, 0, 0)), keep=Keep.TOP, mode=Mode.PRIVATE)
    fillet3_piece_17 = fillet3_piece_17a & fillet3_piece_17b
    add(fillet3_piece_17, mode=Mode.SUBTRACT)

    # Sketch11 → Cut-Extrude8 (cut)
    with BuildSketch(Plane.XY):
        with Locations((0, -62.5)):
            Rectangle(SKETCH11_W, SKETCH11_H)
    extrude(amount=-CUT_EXTRUDE8_DEPTH, mode=Mode.SUBTRACT)

    # Fillet5
    # the kernel refuses this fillet: 10 mm, written as the material it takes off along each edge
    with BuildSketch(Plane(origin=(75, 115, -10), x_dir=(0, 1, 0), z_dir=(1, 0, 0))) as fillet5_piece_1_section:
        Polygon((0, 0), (FILLET5_R, 0), (FILLET5_R, FILLET5_R), (0, FILLET5_R), align=None)
    fillet5_piece_1 = extrude(amount=FILLET5_R, mode=Mode.PRIVATE)
    fillet5_piece_1 = fillet5_piece_1 - Plane(origin=(75, 115, -10), x_dir=(0, -0.7071067811865475, -0.7071067811865475), z_dir=(1, 0, 0)) * Sphere(FILLET5_R, mode=Mode.PRIVATE)
    add(fillet5_piece_1, mode=Mode.SUBTRACT)
    with BuildSketch(Plane(origin=(75, 115, -90), x_dir=(0, 1, 0), z_dir=(1, 0, 0))) as fillet5_piece_2_section:
        Polygon((0, 0), (FILLET5_R, 0), (FILLET5_R, -FILLET5_R), (0, -FILLET5_R), align=None)
    fillet5_piece_2 = extrude(amount=FILLET5_R, mode=Mode.PRIVATE)
    fillet5_piece_2 = fillet5_piece_2 - Plane(origin=(75, 115, -90), x_dir=(0, -0.7071067811865475, 0.7071067811865475), z_dir=(1, 0, 0)) * Sphere(FILLET5_R, mode=Mode.PRIVATE)
    add(fillet5_piece_2, mode=Mode.SUBTRACT)
    with BuildSketch(Plane(origin=(-75, 115, -90), x_dir=(0, 1, 0), z_dir=(-1, 0, 0))) as fillet5_piece_3_section:
        Polygon((0, 0), (FILLET5_R, 0), (FILLET5_R, FILLET5_R), (0, FILLET5_R), align=None)
    fillet5_piece_3 = extrude(amount=FILLET5_R, mode=Mode.PRIVATE)
    fillet5_piece_3 = fillet5_piece_3 - Plane(origin=(-75, 115, -90), x_dir=(0, -0.7071067811865475, 0.7071067811865475), z_dir=(-1, 0, 0)) * Sphere(FILLET5_R, mode=Mode.PRIVATE)
    add(fillet5_piece_3, mode=Mode.SUBTRACT)
    with BuildSketch(Plane(origin=(-75, 115, -10), x_dir=(0, 1, 0), z_dir=(-1, 0, 0))) as fillet5_piece_4_section:
        Polygon((0, 0), (FILLET5_R, 0), (FILLET5_R, -FILLET5_R), (0, -FILLET5_R), align=None)
    fillet5_piece_4 = extrude(amount=FILLET5_R, mode=Mode.PRIVATE)
    fillet5_piece_4 = fillet5_piece_4 - Plane(origin=(-75, 115, -10), x_dir=(0, -0.7071067811865475, -0.7071067811865475), z_dir=(-1, 0, 0)) * Sphere(FILLET5_R, mode=Mode.PRIVATE)
    add(fillet5_piece_4, mode=Mode.SUBTRACT)
    with BuildSketch(Plane(origin=(85, 125, -10), x_dir=(0, -1, 0), z_dir=(0, 0, -1))) as fillet5_piece_5:
        with BuildLine():
            CenterArc((FILLET5_R, FILLET5_R), FILLET5_R, 180, 90)
            Line((0, FILLET5_R), (0, 0))
            Line((0, 0), (FILLET5_R, 0))
        make_face()
    extrude(amount=80, mode=Mode.SUBTRACT)
    with BuildSketch(Plane(origin=(-85, 125, -10), x_dir=(0, -1, 0), z_dir=(0, 0, -1))) as fillet5_piece_6:
        with BuildLine():
            CenterArc((FILLET5_R, -FILLET5_R), FILLET5_R, 90, 90)
            Line((0, -FILLET5_R), (0, 0))
            Line((0, 0), (FILLET5_R, 0))
        make_face()
    extrude(amount=80, mode=Mode.SUBTRACT)

    # Sketch14 → Cut-Extrude9 (cut, through all)
    with BuildSketch(Plane(origin=(24.8, 0, 0), x_dir=(0, 0, -1), z_dir=(1, 0, 0))):
        with Locations(Location((50, 176, 0), (0, 0, 25.856016698))):
            Circle(SKETCH14_R)
    extrude(amount=-CUT_EXTRUDE9_DEPTH, mode=Mode.SUBTRACT)


with BuildPart() as body_2:
    # Sketch13 → Boss-Extrude7 (new body)
    with BuildSketch(Plane(origin=(0, 0, -100), x_dir=(-1, 0, 0), z_dir=(0, 0, -1))):
        Polygon((-25, -75), (-25, -105), (25.018802851, -105), (25, -75), align=None)
    extrude(amount=BOSS_EXTRUDE7_DEPTH)

    # Fillet4
    # the kernel refuses this fillet: 10 mm, written as the material it takes off along each edge
    with BuildSketch(Plane(origin=(-25.021013242, -108.526683302, -100.1), x_dir=(0, 0, 1), z_dir=(0.0006267615930631998, 0.9999998035849335, 0))) as fillet4_piece_1:
        with BuildLine():
            CenterArc((10, 1.410673598), FILLET4_R, 180, 8.109614456)
            Line((0, 1.410673598), (0, 0))
            Line((0, 0), (0.1, 0))
        make_face()
    extrude(amount=37.053373882, mode=Mode.SUBTRACT)
    with BuildSketch(Plane(origin=(25, -71.473316005, -100.1), x_dir=(0, 0, 1), z_dir=(0, -1, 0))) as fillet4_piece_2:
        with BuildLine():
            CenterArc((10, 1.410673598), FILLET4_R, 180, 8.109614456)
            Line((0, 1.410673598), (0, 0))
            Line((0, 0), (0.1, 0))
        make_face()
    extrude(amount=37.05336799, mode=Mode.SUBTRACT)
    with BuildSketch(Plane(origin=(28.526683995, -105, -100.1), x_dir=(0, 0, 1), z_dir=(-1, 0, 0))) as fillet4_piece_3:
        with BuildLine():
            CenterArc((10, 1.410673598), FILLET4_R, 180, 8.109614456)
            Line((0, 1.410673598), (0, 0))
            Line((0, 0), (0.1, 0))
        make_face()
    extrude(amount=57.072170841, mode=Mode.SUBTRACT)


solid = Compound([part.part, body_2.part])
